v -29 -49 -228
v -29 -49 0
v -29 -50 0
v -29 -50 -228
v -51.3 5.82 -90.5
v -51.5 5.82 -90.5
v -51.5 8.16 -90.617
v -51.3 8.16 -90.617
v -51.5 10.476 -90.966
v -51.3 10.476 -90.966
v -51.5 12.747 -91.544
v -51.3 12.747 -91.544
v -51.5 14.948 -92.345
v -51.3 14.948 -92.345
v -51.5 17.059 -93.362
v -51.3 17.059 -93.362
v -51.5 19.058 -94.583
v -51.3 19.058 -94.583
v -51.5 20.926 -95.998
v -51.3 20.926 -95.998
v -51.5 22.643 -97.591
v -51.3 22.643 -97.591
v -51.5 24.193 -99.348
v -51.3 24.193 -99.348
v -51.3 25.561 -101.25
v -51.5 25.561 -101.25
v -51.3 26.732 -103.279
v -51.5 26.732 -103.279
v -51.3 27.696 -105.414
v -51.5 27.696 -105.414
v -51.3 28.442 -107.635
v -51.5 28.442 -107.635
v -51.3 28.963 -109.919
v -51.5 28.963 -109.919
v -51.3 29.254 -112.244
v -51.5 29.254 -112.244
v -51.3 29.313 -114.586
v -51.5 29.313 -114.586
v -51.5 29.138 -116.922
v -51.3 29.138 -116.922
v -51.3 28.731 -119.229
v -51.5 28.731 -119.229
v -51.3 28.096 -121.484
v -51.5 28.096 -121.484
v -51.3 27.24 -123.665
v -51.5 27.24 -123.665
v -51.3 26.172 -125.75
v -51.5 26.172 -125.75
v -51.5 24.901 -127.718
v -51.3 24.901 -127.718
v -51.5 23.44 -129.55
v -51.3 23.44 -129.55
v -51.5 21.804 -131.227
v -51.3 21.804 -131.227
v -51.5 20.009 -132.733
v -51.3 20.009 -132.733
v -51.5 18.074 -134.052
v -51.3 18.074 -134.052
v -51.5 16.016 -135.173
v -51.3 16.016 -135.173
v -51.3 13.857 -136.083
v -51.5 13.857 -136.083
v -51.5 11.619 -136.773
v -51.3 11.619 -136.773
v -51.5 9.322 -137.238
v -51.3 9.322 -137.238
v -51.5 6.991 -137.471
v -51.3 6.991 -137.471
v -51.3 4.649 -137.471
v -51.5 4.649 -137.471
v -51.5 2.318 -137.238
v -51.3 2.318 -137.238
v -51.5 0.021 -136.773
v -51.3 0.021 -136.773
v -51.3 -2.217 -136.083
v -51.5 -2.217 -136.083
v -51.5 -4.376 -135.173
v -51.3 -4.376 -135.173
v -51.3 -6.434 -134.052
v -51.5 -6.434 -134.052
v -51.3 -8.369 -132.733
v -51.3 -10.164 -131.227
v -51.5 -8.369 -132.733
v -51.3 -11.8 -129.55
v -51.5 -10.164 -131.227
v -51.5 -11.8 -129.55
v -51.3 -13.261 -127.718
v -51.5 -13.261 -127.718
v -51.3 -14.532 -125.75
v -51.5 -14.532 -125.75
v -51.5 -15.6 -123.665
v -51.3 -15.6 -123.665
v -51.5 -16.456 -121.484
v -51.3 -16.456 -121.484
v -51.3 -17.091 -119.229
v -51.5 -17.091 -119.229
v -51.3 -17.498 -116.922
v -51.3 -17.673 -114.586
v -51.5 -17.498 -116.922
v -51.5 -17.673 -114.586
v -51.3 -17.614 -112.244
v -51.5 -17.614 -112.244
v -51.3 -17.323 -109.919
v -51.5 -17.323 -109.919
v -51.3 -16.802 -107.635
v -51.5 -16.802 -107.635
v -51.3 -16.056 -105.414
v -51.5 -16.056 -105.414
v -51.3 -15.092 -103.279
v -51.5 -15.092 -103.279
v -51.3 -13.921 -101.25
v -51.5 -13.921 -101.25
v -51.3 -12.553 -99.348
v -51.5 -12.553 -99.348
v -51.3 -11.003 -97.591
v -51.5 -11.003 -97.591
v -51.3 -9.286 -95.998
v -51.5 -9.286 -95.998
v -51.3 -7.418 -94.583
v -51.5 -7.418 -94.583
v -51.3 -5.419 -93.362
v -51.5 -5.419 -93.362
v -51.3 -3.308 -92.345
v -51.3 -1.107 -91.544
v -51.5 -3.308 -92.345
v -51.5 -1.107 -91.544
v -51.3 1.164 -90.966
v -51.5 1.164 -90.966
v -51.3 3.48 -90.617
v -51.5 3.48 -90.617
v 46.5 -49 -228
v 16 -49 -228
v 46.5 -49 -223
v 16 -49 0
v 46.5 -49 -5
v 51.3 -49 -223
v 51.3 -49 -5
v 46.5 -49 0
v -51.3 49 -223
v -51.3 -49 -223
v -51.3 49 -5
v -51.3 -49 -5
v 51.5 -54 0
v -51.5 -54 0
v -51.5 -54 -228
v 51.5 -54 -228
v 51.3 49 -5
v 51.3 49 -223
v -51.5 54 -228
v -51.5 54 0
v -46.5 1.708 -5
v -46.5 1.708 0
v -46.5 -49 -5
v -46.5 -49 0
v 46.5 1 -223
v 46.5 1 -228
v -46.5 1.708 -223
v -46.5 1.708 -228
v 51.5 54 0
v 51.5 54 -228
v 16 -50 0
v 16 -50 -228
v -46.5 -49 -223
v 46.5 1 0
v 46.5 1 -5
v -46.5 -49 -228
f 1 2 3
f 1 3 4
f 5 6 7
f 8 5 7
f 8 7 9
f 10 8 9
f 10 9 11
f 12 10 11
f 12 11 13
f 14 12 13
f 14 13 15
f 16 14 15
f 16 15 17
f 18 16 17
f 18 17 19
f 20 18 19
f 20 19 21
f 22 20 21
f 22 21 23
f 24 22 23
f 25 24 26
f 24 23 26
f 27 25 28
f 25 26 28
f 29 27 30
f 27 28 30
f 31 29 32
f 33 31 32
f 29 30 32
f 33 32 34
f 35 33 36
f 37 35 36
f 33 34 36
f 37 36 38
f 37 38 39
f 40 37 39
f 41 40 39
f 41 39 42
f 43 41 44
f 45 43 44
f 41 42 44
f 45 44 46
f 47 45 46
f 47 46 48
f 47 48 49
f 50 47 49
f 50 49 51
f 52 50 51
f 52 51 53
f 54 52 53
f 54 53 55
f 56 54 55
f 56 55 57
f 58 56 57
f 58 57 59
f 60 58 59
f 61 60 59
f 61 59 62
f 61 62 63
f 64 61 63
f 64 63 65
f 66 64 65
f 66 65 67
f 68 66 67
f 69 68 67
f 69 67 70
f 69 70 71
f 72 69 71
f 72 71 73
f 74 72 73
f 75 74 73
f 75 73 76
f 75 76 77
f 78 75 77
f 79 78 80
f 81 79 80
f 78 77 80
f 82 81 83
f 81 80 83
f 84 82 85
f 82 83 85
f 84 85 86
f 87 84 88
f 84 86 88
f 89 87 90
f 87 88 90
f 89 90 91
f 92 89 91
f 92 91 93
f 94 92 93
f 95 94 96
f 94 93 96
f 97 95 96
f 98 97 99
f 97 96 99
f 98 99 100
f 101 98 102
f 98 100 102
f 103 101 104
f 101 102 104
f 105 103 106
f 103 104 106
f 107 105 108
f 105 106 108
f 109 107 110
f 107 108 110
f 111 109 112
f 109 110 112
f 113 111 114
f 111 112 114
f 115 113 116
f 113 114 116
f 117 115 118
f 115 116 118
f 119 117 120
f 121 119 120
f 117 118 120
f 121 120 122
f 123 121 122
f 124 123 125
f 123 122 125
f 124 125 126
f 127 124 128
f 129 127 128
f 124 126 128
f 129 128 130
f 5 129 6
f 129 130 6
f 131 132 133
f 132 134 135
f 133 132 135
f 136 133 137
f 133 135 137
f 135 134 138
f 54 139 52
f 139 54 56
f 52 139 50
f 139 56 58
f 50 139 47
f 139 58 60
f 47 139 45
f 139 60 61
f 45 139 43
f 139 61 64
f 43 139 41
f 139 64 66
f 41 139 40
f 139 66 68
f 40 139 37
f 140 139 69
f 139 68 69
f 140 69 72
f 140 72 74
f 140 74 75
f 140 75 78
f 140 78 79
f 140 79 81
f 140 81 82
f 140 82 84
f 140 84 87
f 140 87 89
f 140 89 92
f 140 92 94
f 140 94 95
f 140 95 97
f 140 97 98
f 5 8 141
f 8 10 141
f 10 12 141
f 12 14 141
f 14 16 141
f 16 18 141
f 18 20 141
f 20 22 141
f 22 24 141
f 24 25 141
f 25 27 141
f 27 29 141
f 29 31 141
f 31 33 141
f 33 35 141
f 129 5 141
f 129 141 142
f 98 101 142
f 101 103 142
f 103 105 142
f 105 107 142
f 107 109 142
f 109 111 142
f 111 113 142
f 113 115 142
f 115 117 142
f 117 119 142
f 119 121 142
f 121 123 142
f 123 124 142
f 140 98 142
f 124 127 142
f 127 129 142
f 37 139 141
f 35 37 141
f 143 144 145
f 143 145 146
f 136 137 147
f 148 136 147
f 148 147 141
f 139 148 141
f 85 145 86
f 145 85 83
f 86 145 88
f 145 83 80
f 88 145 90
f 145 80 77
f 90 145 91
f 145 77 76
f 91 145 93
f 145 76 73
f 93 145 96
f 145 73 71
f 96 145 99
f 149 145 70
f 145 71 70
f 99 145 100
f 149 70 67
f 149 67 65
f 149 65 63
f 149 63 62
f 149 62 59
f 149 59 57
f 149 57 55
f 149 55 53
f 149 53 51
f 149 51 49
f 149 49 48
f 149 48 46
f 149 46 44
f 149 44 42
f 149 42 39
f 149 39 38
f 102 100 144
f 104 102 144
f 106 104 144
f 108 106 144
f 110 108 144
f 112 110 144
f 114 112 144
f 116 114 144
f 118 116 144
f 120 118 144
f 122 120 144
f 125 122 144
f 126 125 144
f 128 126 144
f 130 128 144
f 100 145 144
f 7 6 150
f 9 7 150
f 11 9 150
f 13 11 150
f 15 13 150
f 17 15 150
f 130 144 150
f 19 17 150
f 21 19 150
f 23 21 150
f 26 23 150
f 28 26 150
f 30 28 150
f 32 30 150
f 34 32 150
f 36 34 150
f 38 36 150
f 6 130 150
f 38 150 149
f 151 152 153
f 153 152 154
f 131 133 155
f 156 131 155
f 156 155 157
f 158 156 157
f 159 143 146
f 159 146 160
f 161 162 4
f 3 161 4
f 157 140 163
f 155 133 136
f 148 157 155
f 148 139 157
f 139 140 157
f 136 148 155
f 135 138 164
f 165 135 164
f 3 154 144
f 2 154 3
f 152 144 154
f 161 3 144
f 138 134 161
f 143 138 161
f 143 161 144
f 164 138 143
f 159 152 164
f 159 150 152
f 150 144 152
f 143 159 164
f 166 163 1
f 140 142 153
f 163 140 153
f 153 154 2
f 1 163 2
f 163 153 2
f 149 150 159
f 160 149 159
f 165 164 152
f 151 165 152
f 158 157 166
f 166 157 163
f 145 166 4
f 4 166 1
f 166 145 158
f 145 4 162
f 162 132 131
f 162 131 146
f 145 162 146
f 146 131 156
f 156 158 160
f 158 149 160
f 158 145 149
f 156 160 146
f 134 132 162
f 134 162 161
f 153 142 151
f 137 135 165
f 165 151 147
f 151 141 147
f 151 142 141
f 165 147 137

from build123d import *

# Parameters (mm, degrees)
SKETCH_1_W          = 103
SKETCH_1_H          = 108
EXTRUDE_1_DEPTH     = 228
CUT_EXTRUDE_START   = -5
CUT_EXTRUDE_1_DEPTH = 218
SKETCH_3_R          = 8
CUT_EXTRUDE_2_DEPTH = 363
CUT_EXTRUDE_3_REACH = 257.947
SKETCH_4_R          = 23.5
CUT_EXTRUDE_5_DEPTH = 444
CUT_EXTRUDE_6_DEPTH = 1


with BuildPart() as part:
    # 草图1 → 凸台-拉伸1 (new body)
    with BuildSketch(Plane.XY):
        Rectangle(SKETCH_1_W, SKETCH_1_H)
    extrude(amount=-EXTRUDE_1_DEPTH)

    # 草图2 → 切除-拉伸1 (cut)
    with BuildSketch(Plane.XY.offset(CUT_EXTRUDE_START)):
        Polygon((-51.3, -49), (51.3, -49), (51.3, 49), (-0.803988537, 49), (-51.3, 49), align=None)
    extrude(amount=-CUT_EXTRUDE_1_DEPTH, mode=Mode.SUBTRACT)

    # 草图3 → 切除-拉伸2 (cut)
    with BuildSketch(Plane.XY):
        with Locations((21.4, -24.37)):
            Circle(SKETCH_3_R)
    extrude(amount=-CUT_EXTRUDE_2_DEPTH, mode=Mode.SUBTRACT)

    # 草图4 → 切除-拉伸3 (cut, up to next)
    with BuildSketch(Plane.ZY.offset(51.5), mode=Mode.PRIVATE) as cut_extrude_3_sk1:
        with Locations((-114, 5.82)):
            Circle(SKETCH_4_R)
    cut_extrude_3_tool1 = extrude(cut_extrude_3_sk1.sketch, amount=-CUT_EXTRUDE_3_REACH, mode=Mode.PRIVATE) & part.part
    add(cut_extrude_3_tool1.solids().sort_by_distance((-51.5, 5.82, -114))[0], mode=Mode.SUBTRACT)

    # 草图8 → 切除-拉伸5 (cut)
    with BuildSketch(Plane.XY):
        Polygon((0, -49), (46.5, -49), (46.5, 1), (-46.5, 1.708475641), (-46.5, -49), align=None)
    extrude(amount=-CUT_EXTRUDE_5_DEPTH, mode=Mode.SUBTRACT)

    # 草图9 → 切除-拉伸6 (cut)
    with BuildSketch(Plane(origin=(0, -49, 0), x_dir=(1, 0, 0), z_dir=(0, 1, 0))):
        Polygon((-29, 228), (11, 228), (16, 228), (16, 0), (-29, 0), align=None)
    extrude(amount=-CUT_EXTRUDE_6_DEPTH, mode=Mode.SUBTRACT)


solid = part.part
